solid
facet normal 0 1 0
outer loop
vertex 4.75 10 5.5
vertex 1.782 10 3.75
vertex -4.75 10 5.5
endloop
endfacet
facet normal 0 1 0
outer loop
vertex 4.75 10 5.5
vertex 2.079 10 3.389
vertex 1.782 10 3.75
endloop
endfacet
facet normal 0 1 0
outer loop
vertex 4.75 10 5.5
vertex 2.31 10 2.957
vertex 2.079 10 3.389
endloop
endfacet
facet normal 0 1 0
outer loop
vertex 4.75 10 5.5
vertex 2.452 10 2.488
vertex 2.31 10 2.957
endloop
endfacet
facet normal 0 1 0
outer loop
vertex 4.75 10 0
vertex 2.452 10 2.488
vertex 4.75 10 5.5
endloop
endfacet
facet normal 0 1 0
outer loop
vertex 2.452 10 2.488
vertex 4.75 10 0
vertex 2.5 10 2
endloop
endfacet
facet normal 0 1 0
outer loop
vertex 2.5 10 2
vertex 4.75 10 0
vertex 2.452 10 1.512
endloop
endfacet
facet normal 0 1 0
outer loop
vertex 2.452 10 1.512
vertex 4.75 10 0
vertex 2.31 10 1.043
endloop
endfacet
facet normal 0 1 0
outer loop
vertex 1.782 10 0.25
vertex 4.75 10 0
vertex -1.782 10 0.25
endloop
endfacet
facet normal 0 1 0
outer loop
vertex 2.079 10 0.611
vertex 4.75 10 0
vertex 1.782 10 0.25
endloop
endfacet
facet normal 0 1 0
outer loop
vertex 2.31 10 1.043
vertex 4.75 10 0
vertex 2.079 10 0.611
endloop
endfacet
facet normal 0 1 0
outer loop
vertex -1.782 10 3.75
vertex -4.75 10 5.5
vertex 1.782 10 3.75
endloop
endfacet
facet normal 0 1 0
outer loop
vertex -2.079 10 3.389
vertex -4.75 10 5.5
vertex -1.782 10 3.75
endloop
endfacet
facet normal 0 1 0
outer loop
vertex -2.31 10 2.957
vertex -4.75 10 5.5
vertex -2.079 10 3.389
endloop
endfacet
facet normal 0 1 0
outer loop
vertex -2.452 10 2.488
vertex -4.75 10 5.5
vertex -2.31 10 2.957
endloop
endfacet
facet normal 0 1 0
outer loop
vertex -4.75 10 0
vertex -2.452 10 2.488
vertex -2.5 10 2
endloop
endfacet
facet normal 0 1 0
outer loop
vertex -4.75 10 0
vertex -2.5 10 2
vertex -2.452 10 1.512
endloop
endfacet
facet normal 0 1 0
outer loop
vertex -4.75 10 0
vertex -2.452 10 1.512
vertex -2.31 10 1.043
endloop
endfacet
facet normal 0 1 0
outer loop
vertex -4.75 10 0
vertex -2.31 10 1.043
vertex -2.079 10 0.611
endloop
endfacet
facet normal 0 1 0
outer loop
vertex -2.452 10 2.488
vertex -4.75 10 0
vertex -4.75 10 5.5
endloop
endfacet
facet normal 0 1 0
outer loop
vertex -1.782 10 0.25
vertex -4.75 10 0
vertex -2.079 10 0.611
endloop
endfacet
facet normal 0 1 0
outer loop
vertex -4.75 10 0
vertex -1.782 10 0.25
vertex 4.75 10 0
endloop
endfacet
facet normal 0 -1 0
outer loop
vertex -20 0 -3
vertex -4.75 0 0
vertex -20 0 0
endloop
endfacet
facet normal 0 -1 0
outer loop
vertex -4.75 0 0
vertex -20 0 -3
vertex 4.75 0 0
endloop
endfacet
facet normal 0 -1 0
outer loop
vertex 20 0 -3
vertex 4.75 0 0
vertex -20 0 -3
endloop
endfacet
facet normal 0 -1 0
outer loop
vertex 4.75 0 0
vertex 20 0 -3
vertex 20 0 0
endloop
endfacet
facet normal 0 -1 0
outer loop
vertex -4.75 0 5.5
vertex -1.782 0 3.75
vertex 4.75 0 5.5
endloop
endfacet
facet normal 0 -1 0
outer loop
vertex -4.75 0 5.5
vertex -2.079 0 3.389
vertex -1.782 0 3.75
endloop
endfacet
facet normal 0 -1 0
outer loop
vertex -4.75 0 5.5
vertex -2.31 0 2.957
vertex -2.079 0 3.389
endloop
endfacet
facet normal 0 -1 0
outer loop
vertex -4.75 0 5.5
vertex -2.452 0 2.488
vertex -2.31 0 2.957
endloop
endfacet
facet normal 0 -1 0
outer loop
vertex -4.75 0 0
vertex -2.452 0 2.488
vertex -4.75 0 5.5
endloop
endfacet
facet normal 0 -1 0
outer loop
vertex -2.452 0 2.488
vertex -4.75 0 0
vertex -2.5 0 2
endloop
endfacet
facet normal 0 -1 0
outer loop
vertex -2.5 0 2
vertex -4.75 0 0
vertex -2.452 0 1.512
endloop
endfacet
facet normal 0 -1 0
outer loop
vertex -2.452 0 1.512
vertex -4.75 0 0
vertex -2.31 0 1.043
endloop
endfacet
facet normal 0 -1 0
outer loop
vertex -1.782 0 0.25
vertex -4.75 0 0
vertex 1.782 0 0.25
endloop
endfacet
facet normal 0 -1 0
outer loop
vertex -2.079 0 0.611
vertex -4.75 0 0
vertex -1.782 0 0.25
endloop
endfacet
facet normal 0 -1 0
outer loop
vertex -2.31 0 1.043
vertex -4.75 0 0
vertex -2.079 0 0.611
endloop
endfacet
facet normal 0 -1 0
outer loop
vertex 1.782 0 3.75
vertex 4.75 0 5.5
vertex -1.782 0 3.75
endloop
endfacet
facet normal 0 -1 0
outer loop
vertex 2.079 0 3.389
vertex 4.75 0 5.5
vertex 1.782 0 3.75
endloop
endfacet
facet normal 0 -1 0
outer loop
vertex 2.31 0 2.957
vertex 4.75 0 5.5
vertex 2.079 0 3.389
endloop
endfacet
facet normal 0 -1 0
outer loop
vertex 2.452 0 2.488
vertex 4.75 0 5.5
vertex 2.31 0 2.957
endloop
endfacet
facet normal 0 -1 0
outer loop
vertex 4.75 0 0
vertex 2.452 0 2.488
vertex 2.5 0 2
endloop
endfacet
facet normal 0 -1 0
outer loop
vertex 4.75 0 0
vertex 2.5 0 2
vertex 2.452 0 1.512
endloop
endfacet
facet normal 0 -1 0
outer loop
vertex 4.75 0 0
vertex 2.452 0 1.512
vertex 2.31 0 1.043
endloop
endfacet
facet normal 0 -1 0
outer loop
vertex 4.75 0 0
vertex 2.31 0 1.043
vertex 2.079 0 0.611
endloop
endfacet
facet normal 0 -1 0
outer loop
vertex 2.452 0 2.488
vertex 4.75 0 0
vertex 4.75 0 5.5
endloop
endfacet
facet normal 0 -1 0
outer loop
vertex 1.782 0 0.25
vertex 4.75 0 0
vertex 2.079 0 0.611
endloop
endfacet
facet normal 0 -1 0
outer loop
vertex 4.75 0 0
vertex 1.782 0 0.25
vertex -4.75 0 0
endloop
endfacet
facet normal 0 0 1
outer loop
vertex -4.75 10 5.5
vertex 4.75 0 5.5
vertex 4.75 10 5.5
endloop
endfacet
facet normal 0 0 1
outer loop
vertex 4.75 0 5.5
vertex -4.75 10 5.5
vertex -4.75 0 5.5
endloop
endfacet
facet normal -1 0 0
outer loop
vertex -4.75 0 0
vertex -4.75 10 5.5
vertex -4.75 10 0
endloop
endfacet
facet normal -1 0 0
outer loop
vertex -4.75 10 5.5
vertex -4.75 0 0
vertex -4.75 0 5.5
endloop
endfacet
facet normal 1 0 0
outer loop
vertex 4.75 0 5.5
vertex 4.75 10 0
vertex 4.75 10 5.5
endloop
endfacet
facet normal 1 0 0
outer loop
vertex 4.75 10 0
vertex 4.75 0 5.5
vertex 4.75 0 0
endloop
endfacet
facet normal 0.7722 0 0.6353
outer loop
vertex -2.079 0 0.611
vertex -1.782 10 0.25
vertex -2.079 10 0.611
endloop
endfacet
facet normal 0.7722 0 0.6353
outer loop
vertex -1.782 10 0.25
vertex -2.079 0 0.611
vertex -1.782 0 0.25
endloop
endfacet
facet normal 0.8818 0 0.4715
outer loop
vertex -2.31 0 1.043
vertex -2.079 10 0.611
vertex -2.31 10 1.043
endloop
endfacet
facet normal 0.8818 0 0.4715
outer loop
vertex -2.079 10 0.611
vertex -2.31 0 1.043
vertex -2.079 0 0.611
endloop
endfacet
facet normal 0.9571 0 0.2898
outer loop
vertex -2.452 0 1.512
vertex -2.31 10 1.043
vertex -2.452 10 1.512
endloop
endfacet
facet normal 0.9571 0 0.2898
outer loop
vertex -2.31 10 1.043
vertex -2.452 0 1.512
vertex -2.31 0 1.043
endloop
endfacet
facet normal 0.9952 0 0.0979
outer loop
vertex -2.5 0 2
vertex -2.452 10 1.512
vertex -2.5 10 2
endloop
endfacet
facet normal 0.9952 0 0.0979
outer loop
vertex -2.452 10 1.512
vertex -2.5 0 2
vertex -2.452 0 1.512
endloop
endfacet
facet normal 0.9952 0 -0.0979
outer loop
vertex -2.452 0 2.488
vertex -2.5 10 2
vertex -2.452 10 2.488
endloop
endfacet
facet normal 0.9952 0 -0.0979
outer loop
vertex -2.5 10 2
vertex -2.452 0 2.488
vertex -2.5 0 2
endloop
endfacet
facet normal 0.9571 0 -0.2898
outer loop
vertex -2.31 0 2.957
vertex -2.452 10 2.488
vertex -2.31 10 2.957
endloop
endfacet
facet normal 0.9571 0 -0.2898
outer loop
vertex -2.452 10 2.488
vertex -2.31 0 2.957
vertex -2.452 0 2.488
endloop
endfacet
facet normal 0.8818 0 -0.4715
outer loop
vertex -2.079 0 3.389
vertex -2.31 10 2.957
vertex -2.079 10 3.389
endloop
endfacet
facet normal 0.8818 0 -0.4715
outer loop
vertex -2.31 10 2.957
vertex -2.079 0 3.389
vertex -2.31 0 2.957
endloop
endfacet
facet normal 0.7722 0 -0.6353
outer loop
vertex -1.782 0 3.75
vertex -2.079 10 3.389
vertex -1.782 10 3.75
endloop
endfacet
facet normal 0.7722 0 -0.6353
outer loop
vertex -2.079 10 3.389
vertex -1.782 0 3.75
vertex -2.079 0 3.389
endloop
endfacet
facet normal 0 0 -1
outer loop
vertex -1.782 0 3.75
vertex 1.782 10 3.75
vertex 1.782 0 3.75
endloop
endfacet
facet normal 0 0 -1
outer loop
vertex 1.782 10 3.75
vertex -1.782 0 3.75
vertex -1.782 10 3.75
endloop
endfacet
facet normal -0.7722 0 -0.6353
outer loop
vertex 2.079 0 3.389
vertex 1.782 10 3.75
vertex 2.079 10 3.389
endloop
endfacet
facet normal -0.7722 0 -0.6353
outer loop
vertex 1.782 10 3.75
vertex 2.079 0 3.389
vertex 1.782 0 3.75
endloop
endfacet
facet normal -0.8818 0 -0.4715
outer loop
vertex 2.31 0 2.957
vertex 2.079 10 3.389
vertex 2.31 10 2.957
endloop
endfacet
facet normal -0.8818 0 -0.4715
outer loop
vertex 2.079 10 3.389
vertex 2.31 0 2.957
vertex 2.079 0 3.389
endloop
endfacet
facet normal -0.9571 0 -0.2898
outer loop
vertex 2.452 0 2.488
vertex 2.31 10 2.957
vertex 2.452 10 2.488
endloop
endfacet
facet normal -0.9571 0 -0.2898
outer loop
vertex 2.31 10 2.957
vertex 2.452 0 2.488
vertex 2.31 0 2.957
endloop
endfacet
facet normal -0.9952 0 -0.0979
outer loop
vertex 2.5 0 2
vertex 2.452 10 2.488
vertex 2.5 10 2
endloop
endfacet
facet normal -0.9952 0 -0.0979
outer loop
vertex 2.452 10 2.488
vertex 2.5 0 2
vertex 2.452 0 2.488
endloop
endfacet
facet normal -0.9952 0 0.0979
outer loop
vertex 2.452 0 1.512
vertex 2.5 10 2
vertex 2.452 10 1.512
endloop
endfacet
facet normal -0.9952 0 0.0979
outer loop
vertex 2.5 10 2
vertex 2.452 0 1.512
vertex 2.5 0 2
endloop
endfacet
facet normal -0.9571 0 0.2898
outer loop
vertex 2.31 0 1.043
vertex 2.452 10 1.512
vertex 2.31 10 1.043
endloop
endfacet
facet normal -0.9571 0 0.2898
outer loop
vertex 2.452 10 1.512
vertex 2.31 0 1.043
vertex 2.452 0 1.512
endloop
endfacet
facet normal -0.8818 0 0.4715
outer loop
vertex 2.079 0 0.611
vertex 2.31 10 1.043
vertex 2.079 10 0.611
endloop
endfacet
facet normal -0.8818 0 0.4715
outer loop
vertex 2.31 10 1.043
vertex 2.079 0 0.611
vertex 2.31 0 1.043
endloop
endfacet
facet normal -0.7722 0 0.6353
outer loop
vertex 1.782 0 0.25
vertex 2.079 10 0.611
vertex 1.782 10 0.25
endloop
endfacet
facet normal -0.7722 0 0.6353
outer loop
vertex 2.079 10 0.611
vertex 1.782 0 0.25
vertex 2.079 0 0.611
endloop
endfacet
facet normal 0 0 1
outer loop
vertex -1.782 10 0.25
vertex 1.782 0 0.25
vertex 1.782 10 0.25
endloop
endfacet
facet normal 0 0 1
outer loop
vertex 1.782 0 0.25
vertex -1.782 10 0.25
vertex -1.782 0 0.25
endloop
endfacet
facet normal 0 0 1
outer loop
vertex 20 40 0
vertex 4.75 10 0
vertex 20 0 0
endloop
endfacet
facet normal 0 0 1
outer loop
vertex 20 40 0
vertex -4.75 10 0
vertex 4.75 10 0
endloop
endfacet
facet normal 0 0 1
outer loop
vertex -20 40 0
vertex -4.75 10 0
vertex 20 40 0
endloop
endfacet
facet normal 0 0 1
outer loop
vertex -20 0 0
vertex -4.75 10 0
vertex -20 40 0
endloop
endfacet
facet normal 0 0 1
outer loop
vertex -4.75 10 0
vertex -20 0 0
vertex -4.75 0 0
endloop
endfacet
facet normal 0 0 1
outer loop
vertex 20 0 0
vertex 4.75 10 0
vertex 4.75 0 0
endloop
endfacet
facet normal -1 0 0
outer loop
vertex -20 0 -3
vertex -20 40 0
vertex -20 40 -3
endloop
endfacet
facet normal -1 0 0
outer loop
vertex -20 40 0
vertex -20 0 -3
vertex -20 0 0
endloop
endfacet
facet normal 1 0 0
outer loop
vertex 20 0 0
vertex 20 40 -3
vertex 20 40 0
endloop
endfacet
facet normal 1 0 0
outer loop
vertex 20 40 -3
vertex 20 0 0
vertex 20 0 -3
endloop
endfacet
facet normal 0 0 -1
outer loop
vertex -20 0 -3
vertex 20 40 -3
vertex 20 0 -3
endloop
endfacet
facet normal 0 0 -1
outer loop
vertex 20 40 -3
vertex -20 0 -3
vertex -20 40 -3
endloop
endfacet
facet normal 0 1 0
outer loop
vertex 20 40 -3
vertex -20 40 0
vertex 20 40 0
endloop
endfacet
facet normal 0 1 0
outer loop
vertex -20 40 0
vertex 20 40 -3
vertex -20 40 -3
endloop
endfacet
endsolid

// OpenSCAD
shaftRadius = 2.5;
cutoutWidth = 3.5;
perfboardThickness = 1.38;
perfboardShort = 40;

braceWidth = 9.5;
braceDepth = 10;
braceHeight = 7;

wrapperInnerHeight = 3;
wrapperThickness = 1;

totalDepth = 30;

module makeShaftHolder() {
    translate([0,braceDepth,braceHeight/2])
    rotate([90,0,0])
    linear_extrude(height=braceDepth)
    difference() {
        square([braceWidth, braceHeight], center=true);
        intersection() {
            circle(r=shaftRadius,center=true,$fn=32);
            square([100,cutoutWidth],center=true);
        }
    };   
}

module makeWrapperSection(depthParam) {
    rotate([90,0,0])
    translate([0,-(wrapperInnerHeight+wrapperThickness),-depthParam/2])
    difference() {
        linear_extrude(height=depthParam, center=true)
        translate([0,(wrapperInnerHeight + 2*wrapperThickness)/2,0])
        difference() {
            square([perfboardShort,
                    wrapperInnerHeight],
                    center=true);
        };
        
    }
}

translate([0, 0, -1.5])
makeShaftHolder();

makeWrapperSection(braceDepth);
translate([0,braceDepth,0])
makeWrapperSection(30);
